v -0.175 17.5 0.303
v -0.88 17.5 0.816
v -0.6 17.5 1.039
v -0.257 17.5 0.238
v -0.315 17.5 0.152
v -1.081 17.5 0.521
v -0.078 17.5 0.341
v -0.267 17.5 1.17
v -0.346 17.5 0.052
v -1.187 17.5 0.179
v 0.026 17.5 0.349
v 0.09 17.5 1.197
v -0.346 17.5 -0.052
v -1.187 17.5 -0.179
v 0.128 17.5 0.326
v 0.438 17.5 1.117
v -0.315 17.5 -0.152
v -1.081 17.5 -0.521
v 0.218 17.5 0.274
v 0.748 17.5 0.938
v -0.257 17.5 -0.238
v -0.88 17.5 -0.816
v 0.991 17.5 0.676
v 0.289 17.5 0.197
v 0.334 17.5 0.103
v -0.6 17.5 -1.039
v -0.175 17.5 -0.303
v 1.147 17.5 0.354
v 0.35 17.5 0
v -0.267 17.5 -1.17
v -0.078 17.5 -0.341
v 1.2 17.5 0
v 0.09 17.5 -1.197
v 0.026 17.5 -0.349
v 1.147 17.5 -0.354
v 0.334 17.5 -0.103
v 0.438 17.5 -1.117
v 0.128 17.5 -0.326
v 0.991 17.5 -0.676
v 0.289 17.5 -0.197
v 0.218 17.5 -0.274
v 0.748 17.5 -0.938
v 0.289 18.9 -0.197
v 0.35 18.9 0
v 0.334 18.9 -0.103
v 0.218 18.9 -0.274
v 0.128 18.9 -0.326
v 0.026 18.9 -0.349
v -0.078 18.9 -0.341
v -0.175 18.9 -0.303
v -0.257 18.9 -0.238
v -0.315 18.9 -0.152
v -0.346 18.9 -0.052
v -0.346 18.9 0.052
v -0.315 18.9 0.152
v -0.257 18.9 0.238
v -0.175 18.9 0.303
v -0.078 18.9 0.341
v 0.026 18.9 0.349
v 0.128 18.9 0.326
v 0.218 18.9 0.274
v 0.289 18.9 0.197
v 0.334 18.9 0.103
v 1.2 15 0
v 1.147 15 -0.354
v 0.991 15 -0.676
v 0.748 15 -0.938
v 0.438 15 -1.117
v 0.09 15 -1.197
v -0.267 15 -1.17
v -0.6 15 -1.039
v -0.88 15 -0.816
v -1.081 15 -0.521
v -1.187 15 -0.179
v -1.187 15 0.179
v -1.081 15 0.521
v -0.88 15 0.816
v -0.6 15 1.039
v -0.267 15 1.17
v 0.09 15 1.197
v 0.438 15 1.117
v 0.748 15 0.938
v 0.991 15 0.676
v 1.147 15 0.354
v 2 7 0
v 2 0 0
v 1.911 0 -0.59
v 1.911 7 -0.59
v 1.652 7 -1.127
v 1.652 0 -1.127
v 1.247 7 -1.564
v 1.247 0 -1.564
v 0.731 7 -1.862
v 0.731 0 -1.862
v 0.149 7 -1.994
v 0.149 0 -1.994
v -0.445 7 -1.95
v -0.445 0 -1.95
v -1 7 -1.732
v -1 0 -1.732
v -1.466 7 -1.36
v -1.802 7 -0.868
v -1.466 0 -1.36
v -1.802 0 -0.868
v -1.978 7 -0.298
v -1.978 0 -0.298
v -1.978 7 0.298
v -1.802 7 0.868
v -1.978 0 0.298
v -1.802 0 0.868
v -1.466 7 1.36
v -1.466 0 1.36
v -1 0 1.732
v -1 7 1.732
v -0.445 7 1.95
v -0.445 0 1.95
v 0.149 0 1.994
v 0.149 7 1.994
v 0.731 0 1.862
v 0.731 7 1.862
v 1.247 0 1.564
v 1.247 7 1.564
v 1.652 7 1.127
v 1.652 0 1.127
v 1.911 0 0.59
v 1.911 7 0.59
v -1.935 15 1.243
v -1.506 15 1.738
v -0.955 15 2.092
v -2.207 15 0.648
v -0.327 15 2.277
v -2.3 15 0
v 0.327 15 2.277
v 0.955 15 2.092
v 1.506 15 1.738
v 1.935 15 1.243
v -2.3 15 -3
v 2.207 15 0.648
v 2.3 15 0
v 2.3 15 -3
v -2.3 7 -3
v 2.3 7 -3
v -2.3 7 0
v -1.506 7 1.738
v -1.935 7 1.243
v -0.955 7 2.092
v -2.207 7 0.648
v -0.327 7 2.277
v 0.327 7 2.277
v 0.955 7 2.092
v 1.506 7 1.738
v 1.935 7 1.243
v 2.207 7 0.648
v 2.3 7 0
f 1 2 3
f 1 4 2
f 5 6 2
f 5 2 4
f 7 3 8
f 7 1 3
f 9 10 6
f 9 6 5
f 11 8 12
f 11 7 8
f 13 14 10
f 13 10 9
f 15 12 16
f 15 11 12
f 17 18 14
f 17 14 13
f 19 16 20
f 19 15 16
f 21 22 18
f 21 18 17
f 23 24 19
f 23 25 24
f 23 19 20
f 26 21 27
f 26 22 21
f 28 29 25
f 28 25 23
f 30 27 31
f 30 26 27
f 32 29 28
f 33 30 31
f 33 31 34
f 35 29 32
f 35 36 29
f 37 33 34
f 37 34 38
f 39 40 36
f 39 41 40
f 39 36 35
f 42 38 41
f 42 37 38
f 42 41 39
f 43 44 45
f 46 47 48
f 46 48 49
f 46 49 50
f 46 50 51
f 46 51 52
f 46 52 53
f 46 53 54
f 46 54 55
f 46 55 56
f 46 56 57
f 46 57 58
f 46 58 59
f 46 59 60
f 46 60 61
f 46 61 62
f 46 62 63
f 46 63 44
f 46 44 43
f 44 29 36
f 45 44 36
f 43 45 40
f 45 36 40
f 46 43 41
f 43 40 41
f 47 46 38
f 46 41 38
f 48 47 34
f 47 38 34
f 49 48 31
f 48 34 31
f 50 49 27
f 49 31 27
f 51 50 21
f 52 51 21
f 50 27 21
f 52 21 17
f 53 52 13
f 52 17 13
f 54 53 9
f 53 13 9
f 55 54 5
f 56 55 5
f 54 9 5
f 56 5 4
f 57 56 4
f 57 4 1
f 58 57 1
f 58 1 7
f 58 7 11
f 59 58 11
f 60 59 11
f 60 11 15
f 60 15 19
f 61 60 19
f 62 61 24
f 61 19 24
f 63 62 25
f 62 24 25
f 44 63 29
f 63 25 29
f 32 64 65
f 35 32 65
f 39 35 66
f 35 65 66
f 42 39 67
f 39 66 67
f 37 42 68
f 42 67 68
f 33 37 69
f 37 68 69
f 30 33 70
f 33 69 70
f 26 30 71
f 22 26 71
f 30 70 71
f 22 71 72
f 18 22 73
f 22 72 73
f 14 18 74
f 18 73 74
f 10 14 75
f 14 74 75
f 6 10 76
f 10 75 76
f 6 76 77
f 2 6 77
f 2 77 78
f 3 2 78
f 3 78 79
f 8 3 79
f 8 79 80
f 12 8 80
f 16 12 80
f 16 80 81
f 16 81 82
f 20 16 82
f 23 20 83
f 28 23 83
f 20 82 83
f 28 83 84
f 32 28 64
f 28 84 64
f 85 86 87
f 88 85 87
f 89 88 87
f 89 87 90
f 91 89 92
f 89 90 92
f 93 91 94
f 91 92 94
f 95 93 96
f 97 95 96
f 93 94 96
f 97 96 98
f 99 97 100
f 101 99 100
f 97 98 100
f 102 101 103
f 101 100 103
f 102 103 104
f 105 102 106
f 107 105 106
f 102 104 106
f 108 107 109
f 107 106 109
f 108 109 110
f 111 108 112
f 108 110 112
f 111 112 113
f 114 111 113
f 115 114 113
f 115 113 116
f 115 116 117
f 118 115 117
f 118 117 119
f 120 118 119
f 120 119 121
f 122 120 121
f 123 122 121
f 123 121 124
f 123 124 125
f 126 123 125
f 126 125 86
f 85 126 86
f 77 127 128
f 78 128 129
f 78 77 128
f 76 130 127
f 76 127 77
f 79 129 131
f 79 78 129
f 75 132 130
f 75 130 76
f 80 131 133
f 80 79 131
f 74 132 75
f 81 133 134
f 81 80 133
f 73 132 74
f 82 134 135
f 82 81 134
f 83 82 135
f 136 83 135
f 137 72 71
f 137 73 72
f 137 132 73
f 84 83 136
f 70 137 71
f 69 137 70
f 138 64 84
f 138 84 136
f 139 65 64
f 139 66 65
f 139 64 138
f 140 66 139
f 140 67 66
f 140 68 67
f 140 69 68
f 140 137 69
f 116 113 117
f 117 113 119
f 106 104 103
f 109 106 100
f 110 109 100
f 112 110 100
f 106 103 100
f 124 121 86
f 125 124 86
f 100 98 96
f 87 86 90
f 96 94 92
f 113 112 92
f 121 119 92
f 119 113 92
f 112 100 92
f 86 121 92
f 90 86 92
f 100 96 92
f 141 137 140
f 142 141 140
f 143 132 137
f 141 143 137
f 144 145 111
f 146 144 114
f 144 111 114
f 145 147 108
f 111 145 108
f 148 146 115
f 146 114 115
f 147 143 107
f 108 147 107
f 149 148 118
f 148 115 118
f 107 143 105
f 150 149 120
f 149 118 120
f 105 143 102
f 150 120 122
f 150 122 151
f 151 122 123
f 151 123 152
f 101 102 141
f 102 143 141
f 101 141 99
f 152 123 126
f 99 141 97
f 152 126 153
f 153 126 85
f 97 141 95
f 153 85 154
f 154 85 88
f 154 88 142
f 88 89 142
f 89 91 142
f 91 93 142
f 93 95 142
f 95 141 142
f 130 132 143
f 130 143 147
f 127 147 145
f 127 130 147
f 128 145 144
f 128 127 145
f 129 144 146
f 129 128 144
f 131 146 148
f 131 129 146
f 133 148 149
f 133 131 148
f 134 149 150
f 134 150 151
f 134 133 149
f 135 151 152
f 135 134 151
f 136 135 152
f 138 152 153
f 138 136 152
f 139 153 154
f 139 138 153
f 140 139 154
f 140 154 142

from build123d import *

# Parameters (mm, degrees)
ESBO_O2_R                = 2
RESSALTO_EXTRUS_O1_DEPTH = 15
ESBO_O3_R                = 1.2
RESSALTO_EXTRUS_O2_DEPTH = 2.5
ESBO_O4_R                = 0.35
RESSALTO_EXTRUS_O3_DEPTH = 1.4
ESBO_O5_R                = 2.3
ESBO_O5_R_2              = 2
RESSALTO_EXTRUS_O4_DEPTH = 8
ESBO_O6_R                = 2.3
ESBO_O6_W                = 4.6
ESBO_O6_H                = 3
RESSALTO_EXTRUS_O6_DEPTH = 8


with BuildPart() as part:
    # Esboço2 → Ressalto-extrusão1 (new body)
    with BuildSketch(Plane(origin=(0, 0, 0), x_dir=(1, 0, 0), z_dir=(0, 1, 0))):
        Circle(ESBO_O2_R)
    extrude(amount=RESSALTO_EXTRUS_O1_DEPTH)

    # Esboço3 → Ressalto-extrusão2 (add)
    with BuildSketch(Plane(origin=(0, 15, 0), x_dir=(1, 0, 0), z_dir=(0, 1, 0))):
        Circle(ESBO_O3_R)
    extrude(amount=RESSALTO_EXTRUS_O2_DEPTH)

    # Esboço4 → Ressalto-extrusão3 (add)
    with BuildSketch(Plane(origin=(0, 17.5, 0), x_dir=(1, 0, 0), z_dir=(0, 1, 0))):
        Circle(ESBO_O4_R)
    extrude(amount=RESSALTO_EXTRUS_O3_DEPTH)

    # Esboço5 → Ressalto-extrusão4 (add)
    with BuildSketch(Plane(origin=(0, 15, 0), x_dir=(1, 0, 0), z_dir=(0, 1, 0))):
        Circle(ESBO_O5_R)
        Circle(ESBO_O5_R_2, mode=Mode.SUBTRACT)
    extrude(amount=-RESSALTO_EXTRUS_O4_DEPTH)

    # Esboço6 → Ressalto-extrusão6 (add)
    with BuildSketch(Plane(origin=(0, 15, 0), x_dir=(1, 0, 0), z_dir=(0, 1, 0))):
        Circle(ESBO_O6_R)
        with Locations((0, 1.5)):
            Rectangle(ESBO_O6_W, ESBO_O6_H)
    extrude(amount=-RESSALTO_EXTRUS_O6_DEPTH)


solid = part.part
